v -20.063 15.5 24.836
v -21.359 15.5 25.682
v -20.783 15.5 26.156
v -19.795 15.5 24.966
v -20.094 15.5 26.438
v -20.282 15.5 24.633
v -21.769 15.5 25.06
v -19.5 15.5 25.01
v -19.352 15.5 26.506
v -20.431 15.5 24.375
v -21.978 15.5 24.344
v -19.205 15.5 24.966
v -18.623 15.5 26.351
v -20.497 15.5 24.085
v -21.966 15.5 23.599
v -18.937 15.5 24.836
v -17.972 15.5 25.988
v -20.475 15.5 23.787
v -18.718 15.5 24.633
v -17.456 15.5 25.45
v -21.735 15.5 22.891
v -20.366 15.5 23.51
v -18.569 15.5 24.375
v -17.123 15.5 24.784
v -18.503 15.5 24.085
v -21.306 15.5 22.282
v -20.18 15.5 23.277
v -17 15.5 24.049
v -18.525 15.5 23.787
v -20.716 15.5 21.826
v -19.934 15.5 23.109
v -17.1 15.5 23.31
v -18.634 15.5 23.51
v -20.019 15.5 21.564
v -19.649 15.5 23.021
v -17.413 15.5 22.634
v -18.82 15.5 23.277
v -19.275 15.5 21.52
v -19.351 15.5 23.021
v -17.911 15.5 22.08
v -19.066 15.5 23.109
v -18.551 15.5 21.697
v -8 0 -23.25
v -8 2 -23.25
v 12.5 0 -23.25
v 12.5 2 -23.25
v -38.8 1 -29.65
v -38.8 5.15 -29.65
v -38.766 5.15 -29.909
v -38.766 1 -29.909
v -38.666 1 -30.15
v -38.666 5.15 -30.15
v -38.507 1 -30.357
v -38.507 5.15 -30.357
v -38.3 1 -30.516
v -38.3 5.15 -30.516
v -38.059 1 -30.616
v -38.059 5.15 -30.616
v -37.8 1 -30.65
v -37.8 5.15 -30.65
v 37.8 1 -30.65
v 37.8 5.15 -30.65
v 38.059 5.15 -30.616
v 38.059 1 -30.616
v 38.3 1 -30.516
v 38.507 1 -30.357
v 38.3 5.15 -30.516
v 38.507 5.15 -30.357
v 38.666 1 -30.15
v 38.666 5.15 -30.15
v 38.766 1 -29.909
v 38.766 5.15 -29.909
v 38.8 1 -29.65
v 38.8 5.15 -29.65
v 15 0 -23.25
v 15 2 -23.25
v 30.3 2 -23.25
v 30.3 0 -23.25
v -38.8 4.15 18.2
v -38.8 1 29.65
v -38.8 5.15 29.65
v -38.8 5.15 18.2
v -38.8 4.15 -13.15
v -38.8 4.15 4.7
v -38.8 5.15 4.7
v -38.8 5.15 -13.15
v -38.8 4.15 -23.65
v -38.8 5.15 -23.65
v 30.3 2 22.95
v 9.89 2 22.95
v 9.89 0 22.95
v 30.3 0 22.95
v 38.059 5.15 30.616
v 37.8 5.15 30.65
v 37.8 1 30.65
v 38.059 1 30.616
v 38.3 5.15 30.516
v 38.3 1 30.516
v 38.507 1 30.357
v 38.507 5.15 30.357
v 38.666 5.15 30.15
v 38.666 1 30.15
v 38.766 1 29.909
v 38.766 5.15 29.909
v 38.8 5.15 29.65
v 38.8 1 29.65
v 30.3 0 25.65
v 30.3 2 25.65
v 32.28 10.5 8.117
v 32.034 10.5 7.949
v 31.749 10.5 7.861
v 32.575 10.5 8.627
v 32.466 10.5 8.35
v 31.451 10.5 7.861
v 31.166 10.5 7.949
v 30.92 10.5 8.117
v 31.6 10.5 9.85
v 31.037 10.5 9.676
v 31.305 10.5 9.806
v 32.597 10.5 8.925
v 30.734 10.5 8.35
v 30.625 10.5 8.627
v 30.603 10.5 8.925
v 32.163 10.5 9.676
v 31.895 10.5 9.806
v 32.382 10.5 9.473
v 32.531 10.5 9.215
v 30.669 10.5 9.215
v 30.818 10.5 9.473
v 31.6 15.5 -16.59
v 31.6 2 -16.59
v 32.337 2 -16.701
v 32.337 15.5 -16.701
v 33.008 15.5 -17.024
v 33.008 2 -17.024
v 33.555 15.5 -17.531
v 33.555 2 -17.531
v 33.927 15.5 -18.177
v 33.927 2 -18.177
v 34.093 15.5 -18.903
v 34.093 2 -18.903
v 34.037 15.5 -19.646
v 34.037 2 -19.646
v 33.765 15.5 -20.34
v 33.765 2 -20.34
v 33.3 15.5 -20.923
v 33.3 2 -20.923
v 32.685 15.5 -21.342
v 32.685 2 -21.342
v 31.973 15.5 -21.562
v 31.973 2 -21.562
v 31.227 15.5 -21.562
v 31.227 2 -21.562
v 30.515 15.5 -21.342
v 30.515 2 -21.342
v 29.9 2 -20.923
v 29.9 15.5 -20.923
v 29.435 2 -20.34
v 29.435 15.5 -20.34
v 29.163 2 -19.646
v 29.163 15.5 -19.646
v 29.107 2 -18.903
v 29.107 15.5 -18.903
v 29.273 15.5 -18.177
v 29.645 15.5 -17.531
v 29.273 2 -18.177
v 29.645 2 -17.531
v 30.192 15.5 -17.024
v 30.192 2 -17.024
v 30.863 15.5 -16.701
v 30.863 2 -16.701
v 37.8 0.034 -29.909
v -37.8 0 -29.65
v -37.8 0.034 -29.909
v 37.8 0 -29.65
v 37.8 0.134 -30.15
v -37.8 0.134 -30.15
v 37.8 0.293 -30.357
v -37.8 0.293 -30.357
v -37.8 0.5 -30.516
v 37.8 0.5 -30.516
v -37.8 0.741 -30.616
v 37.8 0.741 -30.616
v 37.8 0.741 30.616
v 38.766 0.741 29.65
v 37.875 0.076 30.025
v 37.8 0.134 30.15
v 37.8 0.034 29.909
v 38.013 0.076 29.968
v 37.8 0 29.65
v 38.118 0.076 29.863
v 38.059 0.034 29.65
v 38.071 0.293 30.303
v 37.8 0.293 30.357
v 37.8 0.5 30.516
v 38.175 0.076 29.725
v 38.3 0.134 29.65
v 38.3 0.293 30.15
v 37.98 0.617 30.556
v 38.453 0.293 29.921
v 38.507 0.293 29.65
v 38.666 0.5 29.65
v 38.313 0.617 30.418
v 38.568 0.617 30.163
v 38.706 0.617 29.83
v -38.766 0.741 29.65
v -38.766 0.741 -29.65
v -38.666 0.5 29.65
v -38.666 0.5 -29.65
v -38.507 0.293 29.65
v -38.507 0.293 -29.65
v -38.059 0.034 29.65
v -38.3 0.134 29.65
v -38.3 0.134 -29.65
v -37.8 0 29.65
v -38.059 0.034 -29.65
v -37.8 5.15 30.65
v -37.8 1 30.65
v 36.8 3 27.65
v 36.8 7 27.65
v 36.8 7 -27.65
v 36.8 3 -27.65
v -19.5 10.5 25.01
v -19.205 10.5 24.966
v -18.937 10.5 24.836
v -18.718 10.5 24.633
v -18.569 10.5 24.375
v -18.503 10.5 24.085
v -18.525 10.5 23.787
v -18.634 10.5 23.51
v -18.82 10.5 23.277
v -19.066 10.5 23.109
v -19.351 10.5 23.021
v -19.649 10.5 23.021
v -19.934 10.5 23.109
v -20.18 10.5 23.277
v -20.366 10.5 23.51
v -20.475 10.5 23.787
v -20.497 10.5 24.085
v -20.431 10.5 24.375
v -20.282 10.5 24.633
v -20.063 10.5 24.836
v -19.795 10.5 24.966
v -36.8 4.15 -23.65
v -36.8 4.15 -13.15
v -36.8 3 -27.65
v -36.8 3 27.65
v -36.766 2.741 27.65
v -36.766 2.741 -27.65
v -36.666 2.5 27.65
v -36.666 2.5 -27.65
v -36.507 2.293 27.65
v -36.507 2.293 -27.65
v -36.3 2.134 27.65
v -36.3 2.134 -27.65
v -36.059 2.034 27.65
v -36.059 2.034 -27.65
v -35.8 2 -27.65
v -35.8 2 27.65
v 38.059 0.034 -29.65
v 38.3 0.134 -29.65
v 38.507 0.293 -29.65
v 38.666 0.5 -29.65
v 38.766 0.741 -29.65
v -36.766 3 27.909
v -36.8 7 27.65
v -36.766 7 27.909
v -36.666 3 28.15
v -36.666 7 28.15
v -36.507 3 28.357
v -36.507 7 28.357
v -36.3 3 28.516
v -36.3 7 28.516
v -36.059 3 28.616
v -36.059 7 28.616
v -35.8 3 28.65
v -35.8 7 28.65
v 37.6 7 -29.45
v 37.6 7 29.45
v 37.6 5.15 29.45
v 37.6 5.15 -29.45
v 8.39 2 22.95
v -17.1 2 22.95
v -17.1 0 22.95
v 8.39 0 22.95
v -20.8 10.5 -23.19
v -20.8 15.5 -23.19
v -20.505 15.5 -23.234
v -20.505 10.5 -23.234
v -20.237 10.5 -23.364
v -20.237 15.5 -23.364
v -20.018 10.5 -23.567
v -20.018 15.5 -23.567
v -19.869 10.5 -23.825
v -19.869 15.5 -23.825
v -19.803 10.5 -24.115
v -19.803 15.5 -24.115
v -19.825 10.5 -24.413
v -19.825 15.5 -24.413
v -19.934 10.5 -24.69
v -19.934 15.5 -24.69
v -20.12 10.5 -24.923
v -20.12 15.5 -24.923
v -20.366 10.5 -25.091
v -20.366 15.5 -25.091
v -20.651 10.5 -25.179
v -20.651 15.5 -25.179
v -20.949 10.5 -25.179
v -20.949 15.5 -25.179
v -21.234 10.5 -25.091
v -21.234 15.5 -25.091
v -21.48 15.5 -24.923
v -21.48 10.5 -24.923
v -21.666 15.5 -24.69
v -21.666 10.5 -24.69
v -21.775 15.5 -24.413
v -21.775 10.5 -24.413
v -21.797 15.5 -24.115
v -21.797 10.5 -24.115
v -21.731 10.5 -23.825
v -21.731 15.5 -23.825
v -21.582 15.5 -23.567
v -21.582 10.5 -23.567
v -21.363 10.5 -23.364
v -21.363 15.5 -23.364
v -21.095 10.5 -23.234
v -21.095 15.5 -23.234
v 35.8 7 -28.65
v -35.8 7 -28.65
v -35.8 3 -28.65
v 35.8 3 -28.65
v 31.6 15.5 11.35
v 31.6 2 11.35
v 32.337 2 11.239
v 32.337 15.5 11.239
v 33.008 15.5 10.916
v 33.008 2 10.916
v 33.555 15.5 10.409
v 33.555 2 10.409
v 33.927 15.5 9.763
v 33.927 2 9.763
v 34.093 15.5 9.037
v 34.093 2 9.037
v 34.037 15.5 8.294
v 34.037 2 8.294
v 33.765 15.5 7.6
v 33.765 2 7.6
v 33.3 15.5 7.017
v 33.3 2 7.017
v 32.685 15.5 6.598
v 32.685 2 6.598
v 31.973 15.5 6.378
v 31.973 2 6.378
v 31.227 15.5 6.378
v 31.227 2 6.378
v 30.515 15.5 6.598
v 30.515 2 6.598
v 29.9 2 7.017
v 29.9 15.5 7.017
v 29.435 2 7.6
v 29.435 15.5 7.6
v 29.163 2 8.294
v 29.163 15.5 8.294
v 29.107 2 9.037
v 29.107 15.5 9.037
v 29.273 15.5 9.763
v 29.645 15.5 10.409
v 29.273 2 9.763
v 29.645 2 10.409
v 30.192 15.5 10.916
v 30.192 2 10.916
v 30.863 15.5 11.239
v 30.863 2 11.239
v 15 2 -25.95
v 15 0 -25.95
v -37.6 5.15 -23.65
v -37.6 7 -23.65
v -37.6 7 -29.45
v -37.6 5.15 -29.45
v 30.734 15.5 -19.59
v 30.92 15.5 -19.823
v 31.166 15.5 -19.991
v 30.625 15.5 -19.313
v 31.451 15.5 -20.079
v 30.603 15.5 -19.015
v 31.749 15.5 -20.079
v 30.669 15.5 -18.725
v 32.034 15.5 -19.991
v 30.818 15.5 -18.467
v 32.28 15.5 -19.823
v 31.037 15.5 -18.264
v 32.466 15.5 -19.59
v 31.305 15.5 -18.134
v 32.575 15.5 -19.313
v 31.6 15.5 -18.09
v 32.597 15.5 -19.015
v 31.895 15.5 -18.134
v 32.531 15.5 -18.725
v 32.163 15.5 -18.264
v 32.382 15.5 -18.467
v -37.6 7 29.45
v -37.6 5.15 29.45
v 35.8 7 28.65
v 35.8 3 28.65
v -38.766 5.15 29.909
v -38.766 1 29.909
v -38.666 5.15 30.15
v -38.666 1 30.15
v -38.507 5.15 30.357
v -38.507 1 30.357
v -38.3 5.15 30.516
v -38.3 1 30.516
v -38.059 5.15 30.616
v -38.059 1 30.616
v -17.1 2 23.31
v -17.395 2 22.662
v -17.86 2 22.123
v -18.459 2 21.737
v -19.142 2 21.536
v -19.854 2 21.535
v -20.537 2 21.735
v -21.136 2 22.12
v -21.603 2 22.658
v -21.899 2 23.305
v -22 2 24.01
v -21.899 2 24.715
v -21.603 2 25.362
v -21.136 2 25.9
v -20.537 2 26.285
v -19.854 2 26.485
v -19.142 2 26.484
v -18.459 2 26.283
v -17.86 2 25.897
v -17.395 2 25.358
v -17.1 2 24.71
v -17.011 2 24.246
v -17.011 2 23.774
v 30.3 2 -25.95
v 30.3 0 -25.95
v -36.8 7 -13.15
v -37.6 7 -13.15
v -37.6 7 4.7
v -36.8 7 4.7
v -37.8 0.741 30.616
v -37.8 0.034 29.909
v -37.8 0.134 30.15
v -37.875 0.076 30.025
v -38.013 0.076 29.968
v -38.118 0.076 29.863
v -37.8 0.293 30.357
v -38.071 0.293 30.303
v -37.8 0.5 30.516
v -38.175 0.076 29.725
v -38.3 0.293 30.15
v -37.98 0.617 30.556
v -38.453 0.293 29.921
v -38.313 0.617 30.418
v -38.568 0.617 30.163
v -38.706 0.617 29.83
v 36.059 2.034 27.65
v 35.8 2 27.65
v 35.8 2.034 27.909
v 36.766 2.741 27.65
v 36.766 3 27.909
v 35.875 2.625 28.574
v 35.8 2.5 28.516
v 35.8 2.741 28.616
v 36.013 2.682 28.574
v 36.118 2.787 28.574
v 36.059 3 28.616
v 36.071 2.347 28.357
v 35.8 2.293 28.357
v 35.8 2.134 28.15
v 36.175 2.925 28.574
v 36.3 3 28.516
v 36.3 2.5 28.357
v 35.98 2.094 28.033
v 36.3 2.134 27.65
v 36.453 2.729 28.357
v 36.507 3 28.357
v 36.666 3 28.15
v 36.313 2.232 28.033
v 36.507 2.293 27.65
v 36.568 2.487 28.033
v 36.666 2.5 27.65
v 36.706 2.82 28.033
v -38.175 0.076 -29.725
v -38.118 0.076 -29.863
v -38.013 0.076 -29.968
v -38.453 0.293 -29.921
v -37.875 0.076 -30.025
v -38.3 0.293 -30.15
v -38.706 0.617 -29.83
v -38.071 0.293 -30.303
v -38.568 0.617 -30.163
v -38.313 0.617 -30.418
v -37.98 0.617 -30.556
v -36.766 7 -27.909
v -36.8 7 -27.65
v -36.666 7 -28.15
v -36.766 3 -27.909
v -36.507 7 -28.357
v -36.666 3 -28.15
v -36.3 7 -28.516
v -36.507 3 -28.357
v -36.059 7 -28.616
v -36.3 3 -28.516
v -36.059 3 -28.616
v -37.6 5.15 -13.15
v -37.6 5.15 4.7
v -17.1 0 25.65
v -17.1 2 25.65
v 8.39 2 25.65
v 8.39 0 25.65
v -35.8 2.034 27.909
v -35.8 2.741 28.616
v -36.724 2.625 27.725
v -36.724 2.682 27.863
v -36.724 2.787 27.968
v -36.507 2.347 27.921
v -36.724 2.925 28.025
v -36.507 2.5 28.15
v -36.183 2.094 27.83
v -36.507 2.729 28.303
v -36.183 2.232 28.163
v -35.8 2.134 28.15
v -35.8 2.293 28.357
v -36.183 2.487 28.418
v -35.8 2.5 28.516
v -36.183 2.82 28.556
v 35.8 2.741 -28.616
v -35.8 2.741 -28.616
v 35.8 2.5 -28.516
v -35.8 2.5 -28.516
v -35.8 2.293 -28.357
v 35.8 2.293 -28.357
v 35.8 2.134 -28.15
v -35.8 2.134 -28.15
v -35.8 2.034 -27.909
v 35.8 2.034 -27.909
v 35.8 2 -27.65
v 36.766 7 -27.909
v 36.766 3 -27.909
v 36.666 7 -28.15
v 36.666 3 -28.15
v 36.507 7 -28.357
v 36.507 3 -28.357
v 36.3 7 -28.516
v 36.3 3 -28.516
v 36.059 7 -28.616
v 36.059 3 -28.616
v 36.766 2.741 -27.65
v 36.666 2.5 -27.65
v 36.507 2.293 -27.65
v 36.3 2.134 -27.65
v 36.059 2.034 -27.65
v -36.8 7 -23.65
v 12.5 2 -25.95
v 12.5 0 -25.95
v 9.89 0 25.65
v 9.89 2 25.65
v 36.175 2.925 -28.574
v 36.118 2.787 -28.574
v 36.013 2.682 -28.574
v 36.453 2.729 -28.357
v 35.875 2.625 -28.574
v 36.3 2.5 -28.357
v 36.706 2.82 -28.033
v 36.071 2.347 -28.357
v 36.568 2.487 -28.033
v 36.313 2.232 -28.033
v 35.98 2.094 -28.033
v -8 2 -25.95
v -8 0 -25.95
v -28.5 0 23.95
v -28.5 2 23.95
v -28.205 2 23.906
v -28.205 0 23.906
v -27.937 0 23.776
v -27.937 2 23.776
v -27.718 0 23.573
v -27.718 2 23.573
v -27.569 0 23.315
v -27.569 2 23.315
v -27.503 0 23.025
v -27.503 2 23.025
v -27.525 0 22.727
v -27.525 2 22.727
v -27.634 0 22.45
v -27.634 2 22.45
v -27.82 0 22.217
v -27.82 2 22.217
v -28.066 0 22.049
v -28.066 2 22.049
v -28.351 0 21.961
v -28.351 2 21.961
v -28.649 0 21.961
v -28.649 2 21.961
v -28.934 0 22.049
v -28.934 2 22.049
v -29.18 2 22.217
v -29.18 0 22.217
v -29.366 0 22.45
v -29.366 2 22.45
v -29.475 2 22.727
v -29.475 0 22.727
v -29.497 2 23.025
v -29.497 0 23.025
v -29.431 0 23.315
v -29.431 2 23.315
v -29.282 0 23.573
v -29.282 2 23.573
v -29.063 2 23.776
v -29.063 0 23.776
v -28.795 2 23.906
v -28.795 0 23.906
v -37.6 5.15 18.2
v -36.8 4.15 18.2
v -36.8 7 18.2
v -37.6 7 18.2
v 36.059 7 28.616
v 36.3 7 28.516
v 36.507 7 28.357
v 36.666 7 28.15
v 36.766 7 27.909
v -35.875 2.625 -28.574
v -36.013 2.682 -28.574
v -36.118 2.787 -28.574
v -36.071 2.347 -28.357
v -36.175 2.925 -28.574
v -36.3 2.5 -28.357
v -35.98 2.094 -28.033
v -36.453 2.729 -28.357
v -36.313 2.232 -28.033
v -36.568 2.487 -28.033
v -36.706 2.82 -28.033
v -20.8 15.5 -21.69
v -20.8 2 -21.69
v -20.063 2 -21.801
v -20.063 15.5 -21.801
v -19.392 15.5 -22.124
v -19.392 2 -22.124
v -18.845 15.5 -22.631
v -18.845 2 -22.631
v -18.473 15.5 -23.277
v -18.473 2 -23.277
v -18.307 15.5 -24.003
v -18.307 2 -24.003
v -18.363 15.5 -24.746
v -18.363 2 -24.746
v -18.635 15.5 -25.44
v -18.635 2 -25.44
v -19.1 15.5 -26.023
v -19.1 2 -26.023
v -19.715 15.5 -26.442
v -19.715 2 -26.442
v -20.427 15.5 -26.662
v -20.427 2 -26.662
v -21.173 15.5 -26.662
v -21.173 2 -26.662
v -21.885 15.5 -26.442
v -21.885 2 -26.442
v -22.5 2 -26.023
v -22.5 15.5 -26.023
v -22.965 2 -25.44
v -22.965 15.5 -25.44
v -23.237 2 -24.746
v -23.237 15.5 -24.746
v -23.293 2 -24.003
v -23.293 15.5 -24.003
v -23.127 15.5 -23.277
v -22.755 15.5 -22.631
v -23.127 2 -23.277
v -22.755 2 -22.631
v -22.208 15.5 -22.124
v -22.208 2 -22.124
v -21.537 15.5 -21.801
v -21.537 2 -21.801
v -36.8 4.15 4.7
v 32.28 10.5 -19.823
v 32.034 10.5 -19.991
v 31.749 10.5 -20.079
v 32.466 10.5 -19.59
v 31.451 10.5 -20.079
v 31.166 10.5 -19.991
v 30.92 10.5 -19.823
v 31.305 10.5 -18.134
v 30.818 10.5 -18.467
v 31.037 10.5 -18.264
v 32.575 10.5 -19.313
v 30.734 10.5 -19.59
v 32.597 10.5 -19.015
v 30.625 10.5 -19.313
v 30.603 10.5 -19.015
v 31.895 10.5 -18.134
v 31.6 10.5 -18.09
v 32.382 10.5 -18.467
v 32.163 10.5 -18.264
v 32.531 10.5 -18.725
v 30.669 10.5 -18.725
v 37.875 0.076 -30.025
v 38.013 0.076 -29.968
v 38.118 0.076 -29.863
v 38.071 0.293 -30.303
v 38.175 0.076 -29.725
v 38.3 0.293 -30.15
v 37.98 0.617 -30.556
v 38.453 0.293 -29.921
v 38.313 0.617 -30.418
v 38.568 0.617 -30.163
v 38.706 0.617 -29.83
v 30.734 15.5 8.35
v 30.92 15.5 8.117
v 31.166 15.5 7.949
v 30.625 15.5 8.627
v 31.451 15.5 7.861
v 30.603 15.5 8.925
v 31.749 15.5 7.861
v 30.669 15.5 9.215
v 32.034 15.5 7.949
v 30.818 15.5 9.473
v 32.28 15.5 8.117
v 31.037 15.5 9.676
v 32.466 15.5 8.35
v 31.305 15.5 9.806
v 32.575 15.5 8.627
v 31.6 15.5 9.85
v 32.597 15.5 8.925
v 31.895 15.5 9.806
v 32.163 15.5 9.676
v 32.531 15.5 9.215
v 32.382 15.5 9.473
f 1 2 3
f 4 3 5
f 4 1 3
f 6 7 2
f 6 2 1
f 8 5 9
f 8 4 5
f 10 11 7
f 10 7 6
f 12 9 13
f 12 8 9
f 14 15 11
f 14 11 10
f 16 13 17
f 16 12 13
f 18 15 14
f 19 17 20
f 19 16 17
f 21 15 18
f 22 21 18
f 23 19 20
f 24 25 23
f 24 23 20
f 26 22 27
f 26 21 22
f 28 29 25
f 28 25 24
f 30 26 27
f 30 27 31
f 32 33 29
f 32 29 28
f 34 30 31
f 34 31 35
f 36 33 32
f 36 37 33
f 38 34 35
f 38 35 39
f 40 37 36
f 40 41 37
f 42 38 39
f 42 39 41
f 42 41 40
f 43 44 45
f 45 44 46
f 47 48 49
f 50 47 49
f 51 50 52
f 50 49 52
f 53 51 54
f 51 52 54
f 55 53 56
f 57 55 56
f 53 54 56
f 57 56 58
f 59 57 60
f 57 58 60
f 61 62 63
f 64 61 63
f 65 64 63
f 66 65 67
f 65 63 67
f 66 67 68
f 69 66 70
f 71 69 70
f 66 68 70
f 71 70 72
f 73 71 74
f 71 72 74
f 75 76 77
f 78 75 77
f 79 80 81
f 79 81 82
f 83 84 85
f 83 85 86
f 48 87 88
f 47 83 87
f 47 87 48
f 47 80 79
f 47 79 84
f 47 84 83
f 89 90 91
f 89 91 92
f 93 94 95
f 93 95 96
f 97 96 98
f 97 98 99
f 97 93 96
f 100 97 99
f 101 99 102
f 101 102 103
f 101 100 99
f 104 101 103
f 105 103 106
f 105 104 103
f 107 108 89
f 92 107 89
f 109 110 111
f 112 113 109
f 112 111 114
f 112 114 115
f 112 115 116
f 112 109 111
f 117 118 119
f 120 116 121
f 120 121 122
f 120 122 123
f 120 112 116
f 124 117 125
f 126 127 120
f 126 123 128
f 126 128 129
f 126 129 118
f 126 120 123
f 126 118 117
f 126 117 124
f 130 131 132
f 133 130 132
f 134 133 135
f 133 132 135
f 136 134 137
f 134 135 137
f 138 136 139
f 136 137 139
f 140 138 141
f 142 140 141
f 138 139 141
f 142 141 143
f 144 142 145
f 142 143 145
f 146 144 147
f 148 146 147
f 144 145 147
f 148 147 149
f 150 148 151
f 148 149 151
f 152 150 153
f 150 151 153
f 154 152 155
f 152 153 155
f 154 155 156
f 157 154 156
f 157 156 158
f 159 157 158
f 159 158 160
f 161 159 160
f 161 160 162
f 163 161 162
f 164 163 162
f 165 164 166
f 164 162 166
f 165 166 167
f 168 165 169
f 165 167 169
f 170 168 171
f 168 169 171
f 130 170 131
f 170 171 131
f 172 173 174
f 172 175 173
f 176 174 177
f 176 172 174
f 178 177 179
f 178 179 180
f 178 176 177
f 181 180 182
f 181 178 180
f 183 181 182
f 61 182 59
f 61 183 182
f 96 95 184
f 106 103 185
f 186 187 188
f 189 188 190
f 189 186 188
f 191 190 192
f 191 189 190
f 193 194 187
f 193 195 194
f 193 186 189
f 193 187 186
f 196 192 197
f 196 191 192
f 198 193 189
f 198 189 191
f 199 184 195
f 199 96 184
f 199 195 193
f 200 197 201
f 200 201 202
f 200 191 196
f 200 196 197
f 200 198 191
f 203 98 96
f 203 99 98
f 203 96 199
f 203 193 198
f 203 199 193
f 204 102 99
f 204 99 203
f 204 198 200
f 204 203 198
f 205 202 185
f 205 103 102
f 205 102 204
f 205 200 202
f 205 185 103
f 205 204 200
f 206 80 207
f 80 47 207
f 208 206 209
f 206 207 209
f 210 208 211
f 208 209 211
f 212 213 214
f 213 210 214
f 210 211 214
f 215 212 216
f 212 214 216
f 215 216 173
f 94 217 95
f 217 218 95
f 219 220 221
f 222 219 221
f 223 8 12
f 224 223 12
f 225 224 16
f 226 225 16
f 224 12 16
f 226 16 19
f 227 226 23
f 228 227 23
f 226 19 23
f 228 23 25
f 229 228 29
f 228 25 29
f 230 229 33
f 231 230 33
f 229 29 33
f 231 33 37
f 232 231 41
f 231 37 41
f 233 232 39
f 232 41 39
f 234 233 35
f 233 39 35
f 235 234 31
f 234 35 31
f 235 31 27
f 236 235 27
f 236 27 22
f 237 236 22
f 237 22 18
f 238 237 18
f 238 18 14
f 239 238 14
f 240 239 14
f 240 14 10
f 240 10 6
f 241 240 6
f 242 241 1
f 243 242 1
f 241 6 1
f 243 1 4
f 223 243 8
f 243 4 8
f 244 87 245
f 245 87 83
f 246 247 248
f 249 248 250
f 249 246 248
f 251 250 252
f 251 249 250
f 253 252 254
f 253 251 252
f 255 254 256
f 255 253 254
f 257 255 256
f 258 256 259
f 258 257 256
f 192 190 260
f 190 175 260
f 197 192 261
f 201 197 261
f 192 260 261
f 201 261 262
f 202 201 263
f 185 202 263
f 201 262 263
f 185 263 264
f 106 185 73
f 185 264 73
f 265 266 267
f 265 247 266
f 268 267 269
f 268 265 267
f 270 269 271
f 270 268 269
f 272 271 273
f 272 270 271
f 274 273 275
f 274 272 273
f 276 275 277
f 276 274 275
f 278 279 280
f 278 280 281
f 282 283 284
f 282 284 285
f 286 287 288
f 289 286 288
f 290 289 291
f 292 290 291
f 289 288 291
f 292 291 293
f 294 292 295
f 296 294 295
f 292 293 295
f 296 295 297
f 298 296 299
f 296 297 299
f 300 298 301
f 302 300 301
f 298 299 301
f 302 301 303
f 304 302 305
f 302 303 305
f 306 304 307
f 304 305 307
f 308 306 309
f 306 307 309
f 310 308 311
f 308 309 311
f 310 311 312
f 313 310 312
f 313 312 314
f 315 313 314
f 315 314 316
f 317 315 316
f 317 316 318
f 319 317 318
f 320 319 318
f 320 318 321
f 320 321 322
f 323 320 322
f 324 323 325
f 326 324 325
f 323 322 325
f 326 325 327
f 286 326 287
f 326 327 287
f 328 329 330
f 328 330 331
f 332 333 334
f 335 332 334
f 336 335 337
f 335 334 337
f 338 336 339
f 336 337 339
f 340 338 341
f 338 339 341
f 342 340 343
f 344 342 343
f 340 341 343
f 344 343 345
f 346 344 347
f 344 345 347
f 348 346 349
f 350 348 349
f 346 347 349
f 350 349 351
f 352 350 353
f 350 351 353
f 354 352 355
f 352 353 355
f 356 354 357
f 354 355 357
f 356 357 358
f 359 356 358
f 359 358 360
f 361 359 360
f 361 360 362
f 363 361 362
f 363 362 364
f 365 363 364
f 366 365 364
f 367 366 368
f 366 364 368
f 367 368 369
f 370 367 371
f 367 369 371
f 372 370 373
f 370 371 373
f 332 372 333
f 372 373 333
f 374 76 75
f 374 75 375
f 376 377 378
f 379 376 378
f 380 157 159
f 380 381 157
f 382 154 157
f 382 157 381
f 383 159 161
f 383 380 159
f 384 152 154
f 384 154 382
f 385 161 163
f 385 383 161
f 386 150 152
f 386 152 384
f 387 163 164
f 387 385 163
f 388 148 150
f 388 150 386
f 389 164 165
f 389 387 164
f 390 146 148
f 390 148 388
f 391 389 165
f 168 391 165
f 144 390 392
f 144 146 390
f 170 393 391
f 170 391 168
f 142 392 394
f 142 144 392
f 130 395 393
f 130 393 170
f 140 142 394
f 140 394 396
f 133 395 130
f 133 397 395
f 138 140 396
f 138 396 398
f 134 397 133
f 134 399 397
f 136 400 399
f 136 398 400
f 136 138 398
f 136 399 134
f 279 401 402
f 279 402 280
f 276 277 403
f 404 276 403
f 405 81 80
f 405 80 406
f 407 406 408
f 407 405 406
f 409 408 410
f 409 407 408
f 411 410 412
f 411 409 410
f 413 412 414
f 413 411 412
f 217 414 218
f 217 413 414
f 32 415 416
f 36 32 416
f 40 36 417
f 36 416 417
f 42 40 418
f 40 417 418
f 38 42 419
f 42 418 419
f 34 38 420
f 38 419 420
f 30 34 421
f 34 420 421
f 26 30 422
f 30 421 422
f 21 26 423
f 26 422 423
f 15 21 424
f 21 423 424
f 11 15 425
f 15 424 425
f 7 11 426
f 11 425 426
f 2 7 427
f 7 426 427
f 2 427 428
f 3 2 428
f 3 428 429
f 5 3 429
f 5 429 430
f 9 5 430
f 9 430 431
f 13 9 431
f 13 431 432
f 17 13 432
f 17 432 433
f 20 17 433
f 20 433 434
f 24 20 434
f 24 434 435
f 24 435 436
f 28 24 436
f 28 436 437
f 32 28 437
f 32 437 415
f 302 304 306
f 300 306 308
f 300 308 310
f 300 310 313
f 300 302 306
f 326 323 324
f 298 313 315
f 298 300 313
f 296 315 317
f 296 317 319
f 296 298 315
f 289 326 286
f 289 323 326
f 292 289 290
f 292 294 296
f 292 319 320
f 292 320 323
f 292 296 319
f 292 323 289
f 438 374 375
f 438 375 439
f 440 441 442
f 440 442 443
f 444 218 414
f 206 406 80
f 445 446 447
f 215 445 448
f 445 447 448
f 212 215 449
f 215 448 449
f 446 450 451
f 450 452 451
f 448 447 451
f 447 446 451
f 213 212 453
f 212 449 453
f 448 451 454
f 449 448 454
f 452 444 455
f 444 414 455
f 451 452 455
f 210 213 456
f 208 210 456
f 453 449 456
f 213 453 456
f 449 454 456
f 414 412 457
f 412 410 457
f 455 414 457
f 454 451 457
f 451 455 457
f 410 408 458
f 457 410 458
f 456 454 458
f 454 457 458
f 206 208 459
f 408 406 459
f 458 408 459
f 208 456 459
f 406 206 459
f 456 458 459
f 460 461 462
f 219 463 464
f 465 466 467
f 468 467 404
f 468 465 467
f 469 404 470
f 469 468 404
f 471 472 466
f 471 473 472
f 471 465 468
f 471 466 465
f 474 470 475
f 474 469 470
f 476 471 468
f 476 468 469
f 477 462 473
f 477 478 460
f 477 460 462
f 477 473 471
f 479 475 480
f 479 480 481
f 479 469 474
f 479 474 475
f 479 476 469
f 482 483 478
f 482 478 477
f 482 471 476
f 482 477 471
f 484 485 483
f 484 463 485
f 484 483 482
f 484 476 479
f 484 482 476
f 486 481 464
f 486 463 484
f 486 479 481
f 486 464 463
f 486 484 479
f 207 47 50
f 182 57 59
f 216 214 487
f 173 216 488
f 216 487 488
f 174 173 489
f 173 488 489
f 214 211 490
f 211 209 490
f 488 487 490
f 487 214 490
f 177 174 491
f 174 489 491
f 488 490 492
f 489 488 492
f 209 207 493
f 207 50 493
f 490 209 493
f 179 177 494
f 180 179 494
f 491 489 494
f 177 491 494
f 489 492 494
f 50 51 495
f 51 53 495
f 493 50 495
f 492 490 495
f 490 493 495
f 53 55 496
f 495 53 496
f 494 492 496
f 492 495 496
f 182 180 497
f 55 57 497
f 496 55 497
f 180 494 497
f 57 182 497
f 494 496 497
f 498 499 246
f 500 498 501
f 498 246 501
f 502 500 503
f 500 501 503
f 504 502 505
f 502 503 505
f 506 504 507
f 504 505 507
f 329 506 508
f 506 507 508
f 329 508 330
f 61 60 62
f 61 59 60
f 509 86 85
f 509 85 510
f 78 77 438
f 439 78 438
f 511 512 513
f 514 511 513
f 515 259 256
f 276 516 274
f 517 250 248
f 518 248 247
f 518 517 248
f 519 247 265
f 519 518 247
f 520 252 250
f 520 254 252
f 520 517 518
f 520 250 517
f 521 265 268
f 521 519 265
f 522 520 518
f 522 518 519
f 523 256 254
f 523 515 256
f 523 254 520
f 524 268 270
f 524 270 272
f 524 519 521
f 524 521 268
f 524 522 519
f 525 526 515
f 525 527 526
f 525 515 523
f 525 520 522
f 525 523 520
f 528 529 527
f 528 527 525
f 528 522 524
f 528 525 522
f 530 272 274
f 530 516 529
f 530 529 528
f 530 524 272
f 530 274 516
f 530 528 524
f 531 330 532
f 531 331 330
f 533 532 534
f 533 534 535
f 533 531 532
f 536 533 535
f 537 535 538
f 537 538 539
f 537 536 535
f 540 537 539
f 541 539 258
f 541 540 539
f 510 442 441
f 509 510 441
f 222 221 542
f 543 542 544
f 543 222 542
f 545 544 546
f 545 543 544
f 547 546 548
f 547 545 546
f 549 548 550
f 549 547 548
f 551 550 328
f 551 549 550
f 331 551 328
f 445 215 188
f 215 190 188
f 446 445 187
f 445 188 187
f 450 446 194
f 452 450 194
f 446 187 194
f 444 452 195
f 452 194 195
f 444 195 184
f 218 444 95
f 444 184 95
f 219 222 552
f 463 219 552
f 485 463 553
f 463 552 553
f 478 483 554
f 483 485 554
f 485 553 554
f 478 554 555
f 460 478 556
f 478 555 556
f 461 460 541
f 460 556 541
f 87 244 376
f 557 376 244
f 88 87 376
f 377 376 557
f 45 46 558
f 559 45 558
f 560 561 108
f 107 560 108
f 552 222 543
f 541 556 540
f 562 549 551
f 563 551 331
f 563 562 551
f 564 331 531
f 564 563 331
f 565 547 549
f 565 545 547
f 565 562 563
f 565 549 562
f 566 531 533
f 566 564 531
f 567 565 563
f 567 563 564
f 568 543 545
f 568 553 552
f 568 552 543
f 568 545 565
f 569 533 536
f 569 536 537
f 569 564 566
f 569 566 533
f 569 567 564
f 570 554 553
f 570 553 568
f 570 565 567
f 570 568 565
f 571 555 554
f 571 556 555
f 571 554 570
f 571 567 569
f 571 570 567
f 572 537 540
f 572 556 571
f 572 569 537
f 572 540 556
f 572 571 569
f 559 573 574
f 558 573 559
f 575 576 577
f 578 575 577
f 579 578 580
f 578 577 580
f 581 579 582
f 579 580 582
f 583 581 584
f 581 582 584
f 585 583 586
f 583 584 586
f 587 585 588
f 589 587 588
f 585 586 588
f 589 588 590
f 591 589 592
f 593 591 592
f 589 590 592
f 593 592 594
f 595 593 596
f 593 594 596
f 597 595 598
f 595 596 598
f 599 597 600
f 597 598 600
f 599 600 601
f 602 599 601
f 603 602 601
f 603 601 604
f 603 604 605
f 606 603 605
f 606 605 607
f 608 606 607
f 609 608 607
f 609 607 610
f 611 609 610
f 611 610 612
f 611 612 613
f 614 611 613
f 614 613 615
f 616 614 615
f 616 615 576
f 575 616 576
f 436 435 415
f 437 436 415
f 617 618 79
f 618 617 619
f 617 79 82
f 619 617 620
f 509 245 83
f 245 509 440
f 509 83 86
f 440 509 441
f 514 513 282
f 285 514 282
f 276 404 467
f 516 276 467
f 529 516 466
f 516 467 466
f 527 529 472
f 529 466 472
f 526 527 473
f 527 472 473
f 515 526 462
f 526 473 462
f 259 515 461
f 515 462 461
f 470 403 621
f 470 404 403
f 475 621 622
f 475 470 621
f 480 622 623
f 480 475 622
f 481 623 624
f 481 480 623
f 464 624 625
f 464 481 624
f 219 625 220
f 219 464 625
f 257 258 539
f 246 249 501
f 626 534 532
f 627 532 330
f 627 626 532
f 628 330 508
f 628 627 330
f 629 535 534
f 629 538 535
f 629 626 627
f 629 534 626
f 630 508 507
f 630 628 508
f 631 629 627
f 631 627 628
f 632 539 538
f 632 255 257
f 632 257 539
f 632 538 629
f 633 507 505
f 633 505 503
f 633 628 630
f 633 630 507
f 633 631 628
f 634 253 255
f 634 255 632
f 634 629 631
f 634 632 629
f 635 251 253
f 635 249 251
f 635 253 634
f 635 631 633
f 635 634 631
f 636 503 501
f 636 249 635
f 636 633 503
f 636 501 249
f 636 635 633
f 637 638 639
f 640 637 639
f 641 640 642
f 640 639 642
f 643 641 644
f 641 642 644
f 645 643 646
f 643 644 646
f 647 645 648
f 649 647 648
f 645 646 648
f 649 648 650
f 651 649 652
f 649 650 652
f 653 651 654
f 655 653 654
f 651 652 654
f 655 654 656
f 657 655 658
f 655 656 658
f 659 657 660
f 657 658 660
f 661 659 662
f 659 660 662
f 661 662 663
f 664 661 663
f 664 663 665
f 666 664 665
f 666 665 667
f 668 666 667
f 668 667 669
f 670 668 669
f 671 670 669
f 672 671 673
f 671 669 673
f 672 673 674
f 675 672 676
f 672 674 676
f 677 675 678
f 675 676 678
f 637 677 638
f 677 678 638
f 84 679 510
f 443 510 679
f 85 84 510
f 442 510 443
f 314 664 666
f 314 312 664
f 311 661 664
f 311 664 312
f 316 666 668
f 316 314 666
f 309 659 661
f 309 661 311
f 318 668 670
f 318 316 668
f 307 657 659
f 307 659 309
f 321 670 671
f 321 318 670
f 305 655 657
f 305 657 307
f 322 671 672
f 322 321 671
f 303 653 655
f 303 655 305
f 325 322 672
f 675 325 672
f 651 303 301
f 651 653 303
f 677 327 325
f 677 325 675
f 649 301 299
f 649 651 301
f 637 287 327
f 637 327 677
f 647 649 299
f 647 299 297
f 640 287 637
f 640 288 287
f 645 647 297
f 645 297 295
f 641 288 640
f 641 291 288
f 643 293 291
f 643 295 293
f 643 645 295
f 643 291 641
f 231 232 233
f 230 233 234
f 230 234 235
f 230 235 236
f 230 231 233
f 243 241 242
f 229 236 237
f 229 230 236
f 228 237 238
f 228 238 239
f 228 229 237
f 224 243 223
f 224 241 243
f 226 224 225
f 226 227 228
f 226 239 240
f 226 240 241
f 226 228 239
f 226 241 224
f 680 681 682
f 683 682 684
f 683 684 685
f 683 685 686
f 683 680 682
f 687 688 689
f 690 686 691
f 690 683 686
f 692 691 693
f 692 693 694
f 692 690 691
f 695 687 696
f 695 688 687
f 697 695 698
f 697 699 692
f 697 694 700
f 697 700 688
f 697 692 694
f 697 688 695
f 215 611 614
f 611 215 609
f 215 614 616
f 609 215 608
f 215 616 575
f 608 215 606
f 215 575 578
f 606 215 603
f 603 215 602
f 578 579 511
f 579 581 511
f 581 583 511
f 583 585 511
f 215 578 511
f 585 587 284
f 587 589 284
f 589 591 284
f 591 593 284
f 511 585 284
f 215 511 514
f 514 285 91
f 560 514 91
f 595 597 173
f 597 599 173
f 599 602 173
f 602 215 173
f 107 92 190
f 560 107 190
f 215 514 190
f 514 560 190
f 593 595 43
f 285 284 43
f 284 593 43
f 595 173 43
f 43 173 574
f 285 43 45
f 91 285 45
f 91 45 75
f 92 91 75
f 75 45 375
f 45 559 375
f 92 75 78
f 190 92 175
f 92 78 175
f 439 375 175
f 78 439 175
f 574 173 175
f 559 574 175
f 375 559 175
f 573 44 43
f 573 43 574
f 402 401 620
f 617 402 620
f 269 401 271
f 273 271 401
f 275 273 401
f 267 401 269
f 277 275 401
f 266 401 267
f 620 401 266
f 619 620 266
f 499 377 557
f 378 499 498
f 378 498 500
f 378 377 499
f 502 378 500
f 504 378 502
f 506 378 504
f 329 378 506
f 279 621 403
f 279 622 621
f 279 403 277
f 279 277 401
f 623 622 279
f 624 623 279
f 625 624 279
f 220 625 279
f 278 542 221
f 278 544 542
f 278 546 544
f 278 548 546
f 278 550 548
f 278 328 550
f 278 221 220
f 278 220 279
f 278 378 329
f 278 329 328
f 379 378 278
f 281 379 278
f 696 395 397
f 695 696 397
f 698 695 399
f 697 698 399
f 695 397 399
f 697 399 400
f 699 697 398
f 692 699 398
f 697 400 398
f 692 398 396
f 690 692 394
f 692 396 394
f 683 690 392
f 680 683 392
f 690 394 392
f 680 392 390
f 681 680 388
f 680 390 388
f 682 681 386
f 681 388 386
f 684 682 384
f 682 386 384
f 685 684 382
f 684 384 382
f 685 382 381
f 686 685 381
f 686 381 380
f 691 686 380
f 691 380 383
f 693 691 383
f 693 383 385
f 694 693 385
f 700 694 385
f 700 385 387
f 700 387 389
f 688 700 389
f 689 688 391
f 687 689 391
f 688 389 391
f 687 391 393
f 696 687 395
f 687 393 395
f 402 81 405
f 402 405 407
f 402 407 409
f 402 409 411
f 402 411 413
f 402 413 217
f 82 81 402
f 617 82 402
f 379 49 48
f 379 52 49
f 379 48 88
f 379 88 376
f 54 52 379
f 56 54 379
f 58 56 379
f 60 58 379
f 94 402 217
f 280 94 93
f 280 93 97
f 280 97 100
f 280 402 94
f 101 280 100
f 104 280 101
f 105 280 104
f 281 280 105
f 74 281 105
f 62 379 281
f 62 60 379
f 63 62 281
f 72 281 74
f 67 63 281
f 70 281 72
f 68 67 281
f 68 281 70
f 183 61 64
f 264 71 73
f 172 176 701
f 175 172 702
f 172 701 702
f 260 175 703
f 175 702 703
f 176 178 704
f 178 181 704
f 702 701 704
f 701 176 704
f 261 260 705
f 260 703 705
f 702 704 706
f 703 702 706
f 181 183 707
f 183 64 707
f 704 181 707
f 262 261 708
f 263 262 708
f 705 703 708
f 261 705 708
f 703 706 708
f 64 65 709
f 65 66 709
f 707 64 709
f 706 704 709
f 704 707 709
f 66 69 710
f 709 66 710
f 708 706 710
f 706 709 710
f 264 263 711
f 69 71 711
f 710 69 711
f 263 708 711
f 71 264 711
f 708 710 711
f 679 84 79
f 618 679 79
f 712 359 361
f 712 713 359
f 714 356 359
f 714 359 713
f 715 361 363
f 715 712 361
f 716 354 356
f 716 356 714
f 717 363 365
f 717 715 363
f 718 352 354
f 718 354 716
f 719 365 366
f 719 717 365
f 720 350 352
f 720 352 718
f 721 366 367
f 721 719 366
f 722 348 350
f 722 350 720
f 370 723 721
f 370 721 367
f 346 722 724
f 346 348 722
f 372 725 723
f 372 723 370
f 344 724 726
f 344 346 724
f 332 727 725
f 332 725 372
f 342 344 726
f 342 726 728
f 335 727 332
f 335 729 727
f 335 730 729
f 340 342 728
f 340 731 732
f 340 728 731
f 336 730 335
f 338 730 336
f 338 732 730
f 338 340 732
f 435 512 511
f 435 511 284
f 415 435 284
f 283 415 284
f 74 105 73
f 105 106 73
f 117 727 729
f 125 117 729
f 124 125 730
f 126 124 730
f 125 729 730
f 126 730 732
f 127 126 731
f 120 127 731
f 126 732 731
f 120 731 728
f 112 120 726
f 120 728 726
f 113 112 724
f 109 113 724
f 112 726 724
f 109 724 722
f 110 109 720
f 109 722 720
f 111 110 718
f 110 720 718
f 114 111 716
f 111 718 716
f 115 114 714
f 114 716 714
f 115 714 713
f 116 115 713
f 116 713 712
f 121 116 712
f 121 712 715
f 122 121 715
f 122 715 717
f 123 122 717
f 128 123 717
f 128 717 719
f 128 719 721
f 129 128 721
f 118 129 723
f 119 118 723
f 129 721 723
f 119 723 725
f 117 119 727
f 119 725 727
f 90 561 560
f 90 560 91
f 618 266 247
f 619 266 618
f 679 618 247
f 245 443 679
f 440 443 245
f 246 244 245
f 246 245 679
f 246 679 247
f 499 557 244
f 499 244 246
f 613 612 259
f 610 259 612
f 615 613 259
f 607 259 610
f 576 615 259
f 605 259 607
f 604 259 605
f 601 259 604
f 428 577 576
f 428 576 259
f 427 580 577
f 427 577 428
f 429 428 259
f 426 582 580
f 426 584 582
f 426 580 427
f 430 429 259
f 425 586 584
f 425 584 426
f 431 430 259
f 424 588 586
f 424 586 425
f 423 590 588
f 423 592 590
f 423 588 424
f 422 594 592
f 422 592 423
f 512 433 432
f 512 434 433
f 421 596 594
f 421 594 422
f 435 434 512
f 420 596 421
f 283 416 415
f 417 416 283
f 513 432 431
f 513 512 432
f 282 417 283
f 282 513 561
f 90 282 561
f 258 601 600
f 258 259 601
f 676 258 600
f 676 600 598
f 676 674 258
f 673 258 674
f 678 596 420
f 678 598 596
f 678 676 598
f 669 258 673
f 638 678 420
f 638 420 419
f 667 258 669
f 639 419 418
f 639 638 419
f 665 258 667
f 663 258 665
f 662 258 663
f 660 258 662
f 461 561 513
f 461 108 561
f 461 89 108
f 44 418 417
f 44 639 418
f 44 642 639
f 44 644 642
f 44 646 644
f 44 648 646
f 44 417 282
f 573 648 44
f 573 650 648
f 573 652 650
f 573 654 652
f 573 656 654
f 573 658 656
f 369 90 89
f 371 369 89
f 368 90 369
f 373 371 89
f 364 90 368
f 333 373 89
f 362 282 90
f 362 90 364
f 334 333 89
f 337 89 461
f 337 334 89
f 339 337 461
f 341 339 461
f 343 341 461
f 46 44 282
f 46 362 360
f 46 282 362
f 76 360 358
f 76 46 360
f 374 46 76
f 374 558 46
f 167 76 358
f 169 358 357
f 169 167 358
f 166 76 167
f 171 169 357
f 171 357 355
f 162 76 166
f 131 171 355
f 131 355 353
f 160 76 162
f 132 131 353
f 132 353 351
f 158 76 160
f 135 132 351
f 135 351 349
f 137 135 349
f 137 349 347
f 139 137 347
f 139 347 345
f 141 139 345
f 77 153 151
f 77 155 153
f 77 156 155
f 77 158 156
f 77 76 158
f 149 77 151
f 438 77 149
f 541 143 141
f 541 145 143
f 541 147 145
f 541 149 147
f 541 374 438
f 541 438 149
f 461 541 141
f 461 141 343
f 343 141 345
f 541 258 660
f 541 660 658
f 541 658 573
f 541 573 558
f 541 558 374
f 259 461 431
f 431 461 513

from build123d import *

# Parameters (mm, degrees)
SKETCH1_W               = 77.6
SKETCH1_H               = 61.3
BOSS_EXTRUDE1_DEPTH     = 7
SKETCH2_W               = 95.2
SKETCH2_H               = 78.9
SKETCH2_W_2             = 75.2
SKETCH2_H_2             = 58.9
CUT_EXTRUDE_THIN1_DEPTH = 1.85
SKETCH3_W               = 73.6
SKETCH3_H               = 57.3
CUT_EXTRUDE1_DEPTH      = 5
SKETCH4_W               = 13.5
SKETCH4_H               = 2.85
SKETCH4_W_2             = 10.5
CUT_EXTRUDE2_DEPTH      = 5
FILLET1_R               = 1
CUT_EXTRUDE3_REACH      = 51.698
SKETCH5_W               = 20.41
SKETCH5_H               = 2.7
SKETCH5_W_2             = 15.3
SKETCH5_W_3             = 20.5
SKETCH5_W_4             = 25.49
SKETCH6_R               = 2.5
BOSS_EXTRUDE2_DEPTH     = 13.5
SKETCH7_R               = 1
CUT_EXTRUDE4_DEPTH      = 5
CUT_EXTRUDE5_REACH      = 53.255
SKETCH8_R               = 1


with BuildPart() as part:
    # Sketch1 → Boss-Extrude1 (new body)
    with BuildSketch(Plane(origin=(0, 0, 0), x_dir=(1, 0, 0), z_dir=(0, 1, 0))):
        Rectangle(SKETCH1_W, SKETCH1_H)
    extrude(amount=BOSS_EXTRUDE1_DEPTH)

    # Sketch2 → Cut-Extrude-Thin1 (cut)
    with BuildSketch(Plane(origin=(0, 7, 0), x_dir=(1, 0, 0), z_dir=(0, 1, 0))):
        Rectangle(SKETCH2_W, SKETCH2_H)
        Rectangle(SKETCH2_W_2, SKETCH2_H_2, mode=Mode.SUBTRACT)
    extrude(amount=-CUT_EXTRUDE_THIN1_DEPTH, mode=Mode.SUBTRACT)

    # Sketch3 → Cut-Extrude1 (cut)
    with BuildSketch(Plane(origin=(0, 7, 0), x_dir=(1, 0, 0), z_dir=(0, 1, 0))):
        Rectangle(SKETCH3_W, SKETCH3_H)
    extrude(amount=-CUT_EXTRUDE1_DEPTH, mode=Mode.SUBTRACT)

    # Sketch4 → Cut-Extrude2 (cut)
    with BuildSketch(Plane.ZY.offset(38.8)):
        with Locations((11.45, 5.575)):
            Rectangle(SKETCH4_W, SKETCH4_H)
        with Locations((-18.4, 5.575)):
            Rectangle(SKETCH4_W_2, SKETCH4_H)
    extrude(amount=-CUT_EXTRUDE2_DEPTH, mode=Mode.SUBTRACT)

    # Fillet1
    fillet1_edges = [part.edges().sort_by_distance(p)[0] for p in [
        (38.8, 2.575, 30.65),
        (-38.8, 2.575, 30.65),
        (-38.8, 2.575, -30.65),
        (38.8, 2.575, -30.65),
        (36.8, 2, 0),
        (36.8, 4.5, -28.65),
        (0, 2, 28.65),
        (36.8, 4.5, 28.65),
        (-36.8, 2, 0),
        (-36.8, 4.5, 28.65),
        (0, 2, -28.65),
        (-36.8, 4.5, -28.65),
        (0, 0, 30.65),
        (-38.8, 0, 0),
        (0, 0, -30.65),
        (38.8, 0, 0),
    ]]
    fillet(fillet1_edges, radius=FILLET1_R)

    # Sketch5 → Cut-Extrude3 (cut, up to next)
    with BuildSketch(Plane(origin=(0, 2, 0), x_dir=(1, 0, 0), z_dir=(0, 1, 0)), mode=Mode.PRIVATE) as cut_extrude3_sk1:
        with Locations((20.095, -24.3)):
            Rectangle(SKETCH5_W, SKETCH5_H)
    cut_extrude3_tool1 = extrude(cut_extrude3_sk1.sketch, amount=-CUT_EXTRUDE3_REACH, mode=Mode.PRIVATE) & part.part
    # Sketch5 → Cut-Extrude3 (cut, up to next)
    with BuildSketch(Plane(origin=(0, 2, 0), x_dir=(1, 0, 0), z_dir=(0, 1, 0)), mode=Mode.PRIVATE) as cut_extrude3_sk2:
        with Locations((22.65, 24.6)):
            Rectangle(SKETCH5_W_2, SKETCH5_H)
    cut_extrude3_tool2 = extrude(cut_extrude3_sk2.sketch, amount=-CUT_EXTRUDE3_REACH, mode=Mode.PRIVATE) & part.part
    # Sketch5 → Cut-Extrude3 (cut, up to next)
    with BuildSketch(Plane(origin=(0, 2, 0), x_dir=(1, 0, 0), z_dir=(0, 1, 0)), mode=Mode.PRIVATE) as cut_extrude3_sk3:
        with Locations((2.25, 24.6)):
            Rectangle(SKETCH5_W_3, SKETCH5_H)
    cut_extrude3_tool3 = extrude(cut_extrude3_sk3.sketch, amount=-CUT_EXTRUDE3_REACH, mode=Mode.PRIVATE) & part.part
    # Sketch5 → Cut-Extrude3 (cut, up to next)
    with BuildSketch(Plane(origin=(0, 2, 0), x_dir=(1, 0, 0), z_dir=(0, 1, 0)), mode=Mode.PRIVATE) as cut_extrude3_sk4:
        with Locations((-4.355, -24.3)):
            Rectangle(SKETCH5_W_4, SKETCH5_H)
    cut_extrude3_tool4 = extrude(cut_extrude3_sk4.sketch, amount=-CUT_EXTRUDE3_REACH, mode=Mode.PRIVATE) & part.part
    add(cut_extrude3_tool1.solids().sort_by_distance((20.095, 2, 24.3))[0], mode=Mode.SUBTRACT)
    add(cut_extrude3_tool2.solids().sort_by_distance((22.65, 2, -24.6))[0], mode=Mode.SUBTRACT)
    add(cut_extrude3_tool3.solids().sort_by_distance((2.25, 2, -24.6))[0], mode=Mode.SUBTRACT)
    add(cut_extrude3_tool4.solids().sort_by_distance((-4.355, 2, 24.3))[0], mode=Mode.SUBTRACT)

    # Sketch6 → Boss-Extrude2 (add)
    with BuildSketch(Plane(origin=(0, 2, 0), x_dir=(1, 0, 0), z_dir=(0, 1, 0))):
        with Locations(Location((31.6, 19.09, 0), (0, 0, 270))):
            Circle(SKETCH6_R)
        with Locations(Location((31.6, -8.85, 0), (0, 0, 270))):
            Circle(SKETCH6_R)
        with Locations(Location((-19.5, -24.01, 0), (0, 0, 16.260204708))):
            Circle(SKETCH6_R)
        with Locations(Location((-20.8, 24.19, 0), (0, 0, 270))):
            Circle(SKETCH6_R)
    extrude(amount=BOSS_EXTRUDE2_DEPTH)

    # Sketch7 → Cut-Extrude4 (cut)
    with BuildSketch(Plane(origin=(0, 15.5, 0), x_dir=(1, 0, 0), z_dir=(0, 1, 0))):
        with Locations(Location((31.6, 19.09, 0), (0, 0, 270))):
            Circle(SKETCH7_R)
        with Locations(Location((31.6, -8.85, 0), (0, 0, 270))):
            Circle(SKETCH7_R)
        with Locations(Location((-20.8, 24.19, 0), (0, 0, 270))):
            Circle(SKETCH7_R)
        with Locations(Location((-19.5, -24.01, 0), (0, 0, 270))):
            Circle(SKETCH7_R)
    extrude(amount=-CUT_EXTRUDE4_DEPTH, mode=Mode.SUBTRACT)

    # Sketch8 → Cut-Extrude5 (cut, up to next)
    with BuildSketch(Plane(origin=(0, 2, 0), x_dir=(1, 0, 0), z_dir=(0, 1, 0)), mode=Mode.PRIVATE) as cut_extrude5_sk1:
        with Locations(Location((-28.5, -22.95, 0), (0, 0, 270))):
            Circle(SKETCH8_R)
    cut_extrude5_tool1 = extrude(cut_extrude5_sk1.sketch, amount=-CUT_EXTRUDE5_REACH, mode=Mode.PRIVATE) & part.part
    add(cut_extrude5_tool1.solids().sort_by_distance((-28.5, 2, 22.95))[0], mode=Mode.SUBTRACT)


solid = part.part
